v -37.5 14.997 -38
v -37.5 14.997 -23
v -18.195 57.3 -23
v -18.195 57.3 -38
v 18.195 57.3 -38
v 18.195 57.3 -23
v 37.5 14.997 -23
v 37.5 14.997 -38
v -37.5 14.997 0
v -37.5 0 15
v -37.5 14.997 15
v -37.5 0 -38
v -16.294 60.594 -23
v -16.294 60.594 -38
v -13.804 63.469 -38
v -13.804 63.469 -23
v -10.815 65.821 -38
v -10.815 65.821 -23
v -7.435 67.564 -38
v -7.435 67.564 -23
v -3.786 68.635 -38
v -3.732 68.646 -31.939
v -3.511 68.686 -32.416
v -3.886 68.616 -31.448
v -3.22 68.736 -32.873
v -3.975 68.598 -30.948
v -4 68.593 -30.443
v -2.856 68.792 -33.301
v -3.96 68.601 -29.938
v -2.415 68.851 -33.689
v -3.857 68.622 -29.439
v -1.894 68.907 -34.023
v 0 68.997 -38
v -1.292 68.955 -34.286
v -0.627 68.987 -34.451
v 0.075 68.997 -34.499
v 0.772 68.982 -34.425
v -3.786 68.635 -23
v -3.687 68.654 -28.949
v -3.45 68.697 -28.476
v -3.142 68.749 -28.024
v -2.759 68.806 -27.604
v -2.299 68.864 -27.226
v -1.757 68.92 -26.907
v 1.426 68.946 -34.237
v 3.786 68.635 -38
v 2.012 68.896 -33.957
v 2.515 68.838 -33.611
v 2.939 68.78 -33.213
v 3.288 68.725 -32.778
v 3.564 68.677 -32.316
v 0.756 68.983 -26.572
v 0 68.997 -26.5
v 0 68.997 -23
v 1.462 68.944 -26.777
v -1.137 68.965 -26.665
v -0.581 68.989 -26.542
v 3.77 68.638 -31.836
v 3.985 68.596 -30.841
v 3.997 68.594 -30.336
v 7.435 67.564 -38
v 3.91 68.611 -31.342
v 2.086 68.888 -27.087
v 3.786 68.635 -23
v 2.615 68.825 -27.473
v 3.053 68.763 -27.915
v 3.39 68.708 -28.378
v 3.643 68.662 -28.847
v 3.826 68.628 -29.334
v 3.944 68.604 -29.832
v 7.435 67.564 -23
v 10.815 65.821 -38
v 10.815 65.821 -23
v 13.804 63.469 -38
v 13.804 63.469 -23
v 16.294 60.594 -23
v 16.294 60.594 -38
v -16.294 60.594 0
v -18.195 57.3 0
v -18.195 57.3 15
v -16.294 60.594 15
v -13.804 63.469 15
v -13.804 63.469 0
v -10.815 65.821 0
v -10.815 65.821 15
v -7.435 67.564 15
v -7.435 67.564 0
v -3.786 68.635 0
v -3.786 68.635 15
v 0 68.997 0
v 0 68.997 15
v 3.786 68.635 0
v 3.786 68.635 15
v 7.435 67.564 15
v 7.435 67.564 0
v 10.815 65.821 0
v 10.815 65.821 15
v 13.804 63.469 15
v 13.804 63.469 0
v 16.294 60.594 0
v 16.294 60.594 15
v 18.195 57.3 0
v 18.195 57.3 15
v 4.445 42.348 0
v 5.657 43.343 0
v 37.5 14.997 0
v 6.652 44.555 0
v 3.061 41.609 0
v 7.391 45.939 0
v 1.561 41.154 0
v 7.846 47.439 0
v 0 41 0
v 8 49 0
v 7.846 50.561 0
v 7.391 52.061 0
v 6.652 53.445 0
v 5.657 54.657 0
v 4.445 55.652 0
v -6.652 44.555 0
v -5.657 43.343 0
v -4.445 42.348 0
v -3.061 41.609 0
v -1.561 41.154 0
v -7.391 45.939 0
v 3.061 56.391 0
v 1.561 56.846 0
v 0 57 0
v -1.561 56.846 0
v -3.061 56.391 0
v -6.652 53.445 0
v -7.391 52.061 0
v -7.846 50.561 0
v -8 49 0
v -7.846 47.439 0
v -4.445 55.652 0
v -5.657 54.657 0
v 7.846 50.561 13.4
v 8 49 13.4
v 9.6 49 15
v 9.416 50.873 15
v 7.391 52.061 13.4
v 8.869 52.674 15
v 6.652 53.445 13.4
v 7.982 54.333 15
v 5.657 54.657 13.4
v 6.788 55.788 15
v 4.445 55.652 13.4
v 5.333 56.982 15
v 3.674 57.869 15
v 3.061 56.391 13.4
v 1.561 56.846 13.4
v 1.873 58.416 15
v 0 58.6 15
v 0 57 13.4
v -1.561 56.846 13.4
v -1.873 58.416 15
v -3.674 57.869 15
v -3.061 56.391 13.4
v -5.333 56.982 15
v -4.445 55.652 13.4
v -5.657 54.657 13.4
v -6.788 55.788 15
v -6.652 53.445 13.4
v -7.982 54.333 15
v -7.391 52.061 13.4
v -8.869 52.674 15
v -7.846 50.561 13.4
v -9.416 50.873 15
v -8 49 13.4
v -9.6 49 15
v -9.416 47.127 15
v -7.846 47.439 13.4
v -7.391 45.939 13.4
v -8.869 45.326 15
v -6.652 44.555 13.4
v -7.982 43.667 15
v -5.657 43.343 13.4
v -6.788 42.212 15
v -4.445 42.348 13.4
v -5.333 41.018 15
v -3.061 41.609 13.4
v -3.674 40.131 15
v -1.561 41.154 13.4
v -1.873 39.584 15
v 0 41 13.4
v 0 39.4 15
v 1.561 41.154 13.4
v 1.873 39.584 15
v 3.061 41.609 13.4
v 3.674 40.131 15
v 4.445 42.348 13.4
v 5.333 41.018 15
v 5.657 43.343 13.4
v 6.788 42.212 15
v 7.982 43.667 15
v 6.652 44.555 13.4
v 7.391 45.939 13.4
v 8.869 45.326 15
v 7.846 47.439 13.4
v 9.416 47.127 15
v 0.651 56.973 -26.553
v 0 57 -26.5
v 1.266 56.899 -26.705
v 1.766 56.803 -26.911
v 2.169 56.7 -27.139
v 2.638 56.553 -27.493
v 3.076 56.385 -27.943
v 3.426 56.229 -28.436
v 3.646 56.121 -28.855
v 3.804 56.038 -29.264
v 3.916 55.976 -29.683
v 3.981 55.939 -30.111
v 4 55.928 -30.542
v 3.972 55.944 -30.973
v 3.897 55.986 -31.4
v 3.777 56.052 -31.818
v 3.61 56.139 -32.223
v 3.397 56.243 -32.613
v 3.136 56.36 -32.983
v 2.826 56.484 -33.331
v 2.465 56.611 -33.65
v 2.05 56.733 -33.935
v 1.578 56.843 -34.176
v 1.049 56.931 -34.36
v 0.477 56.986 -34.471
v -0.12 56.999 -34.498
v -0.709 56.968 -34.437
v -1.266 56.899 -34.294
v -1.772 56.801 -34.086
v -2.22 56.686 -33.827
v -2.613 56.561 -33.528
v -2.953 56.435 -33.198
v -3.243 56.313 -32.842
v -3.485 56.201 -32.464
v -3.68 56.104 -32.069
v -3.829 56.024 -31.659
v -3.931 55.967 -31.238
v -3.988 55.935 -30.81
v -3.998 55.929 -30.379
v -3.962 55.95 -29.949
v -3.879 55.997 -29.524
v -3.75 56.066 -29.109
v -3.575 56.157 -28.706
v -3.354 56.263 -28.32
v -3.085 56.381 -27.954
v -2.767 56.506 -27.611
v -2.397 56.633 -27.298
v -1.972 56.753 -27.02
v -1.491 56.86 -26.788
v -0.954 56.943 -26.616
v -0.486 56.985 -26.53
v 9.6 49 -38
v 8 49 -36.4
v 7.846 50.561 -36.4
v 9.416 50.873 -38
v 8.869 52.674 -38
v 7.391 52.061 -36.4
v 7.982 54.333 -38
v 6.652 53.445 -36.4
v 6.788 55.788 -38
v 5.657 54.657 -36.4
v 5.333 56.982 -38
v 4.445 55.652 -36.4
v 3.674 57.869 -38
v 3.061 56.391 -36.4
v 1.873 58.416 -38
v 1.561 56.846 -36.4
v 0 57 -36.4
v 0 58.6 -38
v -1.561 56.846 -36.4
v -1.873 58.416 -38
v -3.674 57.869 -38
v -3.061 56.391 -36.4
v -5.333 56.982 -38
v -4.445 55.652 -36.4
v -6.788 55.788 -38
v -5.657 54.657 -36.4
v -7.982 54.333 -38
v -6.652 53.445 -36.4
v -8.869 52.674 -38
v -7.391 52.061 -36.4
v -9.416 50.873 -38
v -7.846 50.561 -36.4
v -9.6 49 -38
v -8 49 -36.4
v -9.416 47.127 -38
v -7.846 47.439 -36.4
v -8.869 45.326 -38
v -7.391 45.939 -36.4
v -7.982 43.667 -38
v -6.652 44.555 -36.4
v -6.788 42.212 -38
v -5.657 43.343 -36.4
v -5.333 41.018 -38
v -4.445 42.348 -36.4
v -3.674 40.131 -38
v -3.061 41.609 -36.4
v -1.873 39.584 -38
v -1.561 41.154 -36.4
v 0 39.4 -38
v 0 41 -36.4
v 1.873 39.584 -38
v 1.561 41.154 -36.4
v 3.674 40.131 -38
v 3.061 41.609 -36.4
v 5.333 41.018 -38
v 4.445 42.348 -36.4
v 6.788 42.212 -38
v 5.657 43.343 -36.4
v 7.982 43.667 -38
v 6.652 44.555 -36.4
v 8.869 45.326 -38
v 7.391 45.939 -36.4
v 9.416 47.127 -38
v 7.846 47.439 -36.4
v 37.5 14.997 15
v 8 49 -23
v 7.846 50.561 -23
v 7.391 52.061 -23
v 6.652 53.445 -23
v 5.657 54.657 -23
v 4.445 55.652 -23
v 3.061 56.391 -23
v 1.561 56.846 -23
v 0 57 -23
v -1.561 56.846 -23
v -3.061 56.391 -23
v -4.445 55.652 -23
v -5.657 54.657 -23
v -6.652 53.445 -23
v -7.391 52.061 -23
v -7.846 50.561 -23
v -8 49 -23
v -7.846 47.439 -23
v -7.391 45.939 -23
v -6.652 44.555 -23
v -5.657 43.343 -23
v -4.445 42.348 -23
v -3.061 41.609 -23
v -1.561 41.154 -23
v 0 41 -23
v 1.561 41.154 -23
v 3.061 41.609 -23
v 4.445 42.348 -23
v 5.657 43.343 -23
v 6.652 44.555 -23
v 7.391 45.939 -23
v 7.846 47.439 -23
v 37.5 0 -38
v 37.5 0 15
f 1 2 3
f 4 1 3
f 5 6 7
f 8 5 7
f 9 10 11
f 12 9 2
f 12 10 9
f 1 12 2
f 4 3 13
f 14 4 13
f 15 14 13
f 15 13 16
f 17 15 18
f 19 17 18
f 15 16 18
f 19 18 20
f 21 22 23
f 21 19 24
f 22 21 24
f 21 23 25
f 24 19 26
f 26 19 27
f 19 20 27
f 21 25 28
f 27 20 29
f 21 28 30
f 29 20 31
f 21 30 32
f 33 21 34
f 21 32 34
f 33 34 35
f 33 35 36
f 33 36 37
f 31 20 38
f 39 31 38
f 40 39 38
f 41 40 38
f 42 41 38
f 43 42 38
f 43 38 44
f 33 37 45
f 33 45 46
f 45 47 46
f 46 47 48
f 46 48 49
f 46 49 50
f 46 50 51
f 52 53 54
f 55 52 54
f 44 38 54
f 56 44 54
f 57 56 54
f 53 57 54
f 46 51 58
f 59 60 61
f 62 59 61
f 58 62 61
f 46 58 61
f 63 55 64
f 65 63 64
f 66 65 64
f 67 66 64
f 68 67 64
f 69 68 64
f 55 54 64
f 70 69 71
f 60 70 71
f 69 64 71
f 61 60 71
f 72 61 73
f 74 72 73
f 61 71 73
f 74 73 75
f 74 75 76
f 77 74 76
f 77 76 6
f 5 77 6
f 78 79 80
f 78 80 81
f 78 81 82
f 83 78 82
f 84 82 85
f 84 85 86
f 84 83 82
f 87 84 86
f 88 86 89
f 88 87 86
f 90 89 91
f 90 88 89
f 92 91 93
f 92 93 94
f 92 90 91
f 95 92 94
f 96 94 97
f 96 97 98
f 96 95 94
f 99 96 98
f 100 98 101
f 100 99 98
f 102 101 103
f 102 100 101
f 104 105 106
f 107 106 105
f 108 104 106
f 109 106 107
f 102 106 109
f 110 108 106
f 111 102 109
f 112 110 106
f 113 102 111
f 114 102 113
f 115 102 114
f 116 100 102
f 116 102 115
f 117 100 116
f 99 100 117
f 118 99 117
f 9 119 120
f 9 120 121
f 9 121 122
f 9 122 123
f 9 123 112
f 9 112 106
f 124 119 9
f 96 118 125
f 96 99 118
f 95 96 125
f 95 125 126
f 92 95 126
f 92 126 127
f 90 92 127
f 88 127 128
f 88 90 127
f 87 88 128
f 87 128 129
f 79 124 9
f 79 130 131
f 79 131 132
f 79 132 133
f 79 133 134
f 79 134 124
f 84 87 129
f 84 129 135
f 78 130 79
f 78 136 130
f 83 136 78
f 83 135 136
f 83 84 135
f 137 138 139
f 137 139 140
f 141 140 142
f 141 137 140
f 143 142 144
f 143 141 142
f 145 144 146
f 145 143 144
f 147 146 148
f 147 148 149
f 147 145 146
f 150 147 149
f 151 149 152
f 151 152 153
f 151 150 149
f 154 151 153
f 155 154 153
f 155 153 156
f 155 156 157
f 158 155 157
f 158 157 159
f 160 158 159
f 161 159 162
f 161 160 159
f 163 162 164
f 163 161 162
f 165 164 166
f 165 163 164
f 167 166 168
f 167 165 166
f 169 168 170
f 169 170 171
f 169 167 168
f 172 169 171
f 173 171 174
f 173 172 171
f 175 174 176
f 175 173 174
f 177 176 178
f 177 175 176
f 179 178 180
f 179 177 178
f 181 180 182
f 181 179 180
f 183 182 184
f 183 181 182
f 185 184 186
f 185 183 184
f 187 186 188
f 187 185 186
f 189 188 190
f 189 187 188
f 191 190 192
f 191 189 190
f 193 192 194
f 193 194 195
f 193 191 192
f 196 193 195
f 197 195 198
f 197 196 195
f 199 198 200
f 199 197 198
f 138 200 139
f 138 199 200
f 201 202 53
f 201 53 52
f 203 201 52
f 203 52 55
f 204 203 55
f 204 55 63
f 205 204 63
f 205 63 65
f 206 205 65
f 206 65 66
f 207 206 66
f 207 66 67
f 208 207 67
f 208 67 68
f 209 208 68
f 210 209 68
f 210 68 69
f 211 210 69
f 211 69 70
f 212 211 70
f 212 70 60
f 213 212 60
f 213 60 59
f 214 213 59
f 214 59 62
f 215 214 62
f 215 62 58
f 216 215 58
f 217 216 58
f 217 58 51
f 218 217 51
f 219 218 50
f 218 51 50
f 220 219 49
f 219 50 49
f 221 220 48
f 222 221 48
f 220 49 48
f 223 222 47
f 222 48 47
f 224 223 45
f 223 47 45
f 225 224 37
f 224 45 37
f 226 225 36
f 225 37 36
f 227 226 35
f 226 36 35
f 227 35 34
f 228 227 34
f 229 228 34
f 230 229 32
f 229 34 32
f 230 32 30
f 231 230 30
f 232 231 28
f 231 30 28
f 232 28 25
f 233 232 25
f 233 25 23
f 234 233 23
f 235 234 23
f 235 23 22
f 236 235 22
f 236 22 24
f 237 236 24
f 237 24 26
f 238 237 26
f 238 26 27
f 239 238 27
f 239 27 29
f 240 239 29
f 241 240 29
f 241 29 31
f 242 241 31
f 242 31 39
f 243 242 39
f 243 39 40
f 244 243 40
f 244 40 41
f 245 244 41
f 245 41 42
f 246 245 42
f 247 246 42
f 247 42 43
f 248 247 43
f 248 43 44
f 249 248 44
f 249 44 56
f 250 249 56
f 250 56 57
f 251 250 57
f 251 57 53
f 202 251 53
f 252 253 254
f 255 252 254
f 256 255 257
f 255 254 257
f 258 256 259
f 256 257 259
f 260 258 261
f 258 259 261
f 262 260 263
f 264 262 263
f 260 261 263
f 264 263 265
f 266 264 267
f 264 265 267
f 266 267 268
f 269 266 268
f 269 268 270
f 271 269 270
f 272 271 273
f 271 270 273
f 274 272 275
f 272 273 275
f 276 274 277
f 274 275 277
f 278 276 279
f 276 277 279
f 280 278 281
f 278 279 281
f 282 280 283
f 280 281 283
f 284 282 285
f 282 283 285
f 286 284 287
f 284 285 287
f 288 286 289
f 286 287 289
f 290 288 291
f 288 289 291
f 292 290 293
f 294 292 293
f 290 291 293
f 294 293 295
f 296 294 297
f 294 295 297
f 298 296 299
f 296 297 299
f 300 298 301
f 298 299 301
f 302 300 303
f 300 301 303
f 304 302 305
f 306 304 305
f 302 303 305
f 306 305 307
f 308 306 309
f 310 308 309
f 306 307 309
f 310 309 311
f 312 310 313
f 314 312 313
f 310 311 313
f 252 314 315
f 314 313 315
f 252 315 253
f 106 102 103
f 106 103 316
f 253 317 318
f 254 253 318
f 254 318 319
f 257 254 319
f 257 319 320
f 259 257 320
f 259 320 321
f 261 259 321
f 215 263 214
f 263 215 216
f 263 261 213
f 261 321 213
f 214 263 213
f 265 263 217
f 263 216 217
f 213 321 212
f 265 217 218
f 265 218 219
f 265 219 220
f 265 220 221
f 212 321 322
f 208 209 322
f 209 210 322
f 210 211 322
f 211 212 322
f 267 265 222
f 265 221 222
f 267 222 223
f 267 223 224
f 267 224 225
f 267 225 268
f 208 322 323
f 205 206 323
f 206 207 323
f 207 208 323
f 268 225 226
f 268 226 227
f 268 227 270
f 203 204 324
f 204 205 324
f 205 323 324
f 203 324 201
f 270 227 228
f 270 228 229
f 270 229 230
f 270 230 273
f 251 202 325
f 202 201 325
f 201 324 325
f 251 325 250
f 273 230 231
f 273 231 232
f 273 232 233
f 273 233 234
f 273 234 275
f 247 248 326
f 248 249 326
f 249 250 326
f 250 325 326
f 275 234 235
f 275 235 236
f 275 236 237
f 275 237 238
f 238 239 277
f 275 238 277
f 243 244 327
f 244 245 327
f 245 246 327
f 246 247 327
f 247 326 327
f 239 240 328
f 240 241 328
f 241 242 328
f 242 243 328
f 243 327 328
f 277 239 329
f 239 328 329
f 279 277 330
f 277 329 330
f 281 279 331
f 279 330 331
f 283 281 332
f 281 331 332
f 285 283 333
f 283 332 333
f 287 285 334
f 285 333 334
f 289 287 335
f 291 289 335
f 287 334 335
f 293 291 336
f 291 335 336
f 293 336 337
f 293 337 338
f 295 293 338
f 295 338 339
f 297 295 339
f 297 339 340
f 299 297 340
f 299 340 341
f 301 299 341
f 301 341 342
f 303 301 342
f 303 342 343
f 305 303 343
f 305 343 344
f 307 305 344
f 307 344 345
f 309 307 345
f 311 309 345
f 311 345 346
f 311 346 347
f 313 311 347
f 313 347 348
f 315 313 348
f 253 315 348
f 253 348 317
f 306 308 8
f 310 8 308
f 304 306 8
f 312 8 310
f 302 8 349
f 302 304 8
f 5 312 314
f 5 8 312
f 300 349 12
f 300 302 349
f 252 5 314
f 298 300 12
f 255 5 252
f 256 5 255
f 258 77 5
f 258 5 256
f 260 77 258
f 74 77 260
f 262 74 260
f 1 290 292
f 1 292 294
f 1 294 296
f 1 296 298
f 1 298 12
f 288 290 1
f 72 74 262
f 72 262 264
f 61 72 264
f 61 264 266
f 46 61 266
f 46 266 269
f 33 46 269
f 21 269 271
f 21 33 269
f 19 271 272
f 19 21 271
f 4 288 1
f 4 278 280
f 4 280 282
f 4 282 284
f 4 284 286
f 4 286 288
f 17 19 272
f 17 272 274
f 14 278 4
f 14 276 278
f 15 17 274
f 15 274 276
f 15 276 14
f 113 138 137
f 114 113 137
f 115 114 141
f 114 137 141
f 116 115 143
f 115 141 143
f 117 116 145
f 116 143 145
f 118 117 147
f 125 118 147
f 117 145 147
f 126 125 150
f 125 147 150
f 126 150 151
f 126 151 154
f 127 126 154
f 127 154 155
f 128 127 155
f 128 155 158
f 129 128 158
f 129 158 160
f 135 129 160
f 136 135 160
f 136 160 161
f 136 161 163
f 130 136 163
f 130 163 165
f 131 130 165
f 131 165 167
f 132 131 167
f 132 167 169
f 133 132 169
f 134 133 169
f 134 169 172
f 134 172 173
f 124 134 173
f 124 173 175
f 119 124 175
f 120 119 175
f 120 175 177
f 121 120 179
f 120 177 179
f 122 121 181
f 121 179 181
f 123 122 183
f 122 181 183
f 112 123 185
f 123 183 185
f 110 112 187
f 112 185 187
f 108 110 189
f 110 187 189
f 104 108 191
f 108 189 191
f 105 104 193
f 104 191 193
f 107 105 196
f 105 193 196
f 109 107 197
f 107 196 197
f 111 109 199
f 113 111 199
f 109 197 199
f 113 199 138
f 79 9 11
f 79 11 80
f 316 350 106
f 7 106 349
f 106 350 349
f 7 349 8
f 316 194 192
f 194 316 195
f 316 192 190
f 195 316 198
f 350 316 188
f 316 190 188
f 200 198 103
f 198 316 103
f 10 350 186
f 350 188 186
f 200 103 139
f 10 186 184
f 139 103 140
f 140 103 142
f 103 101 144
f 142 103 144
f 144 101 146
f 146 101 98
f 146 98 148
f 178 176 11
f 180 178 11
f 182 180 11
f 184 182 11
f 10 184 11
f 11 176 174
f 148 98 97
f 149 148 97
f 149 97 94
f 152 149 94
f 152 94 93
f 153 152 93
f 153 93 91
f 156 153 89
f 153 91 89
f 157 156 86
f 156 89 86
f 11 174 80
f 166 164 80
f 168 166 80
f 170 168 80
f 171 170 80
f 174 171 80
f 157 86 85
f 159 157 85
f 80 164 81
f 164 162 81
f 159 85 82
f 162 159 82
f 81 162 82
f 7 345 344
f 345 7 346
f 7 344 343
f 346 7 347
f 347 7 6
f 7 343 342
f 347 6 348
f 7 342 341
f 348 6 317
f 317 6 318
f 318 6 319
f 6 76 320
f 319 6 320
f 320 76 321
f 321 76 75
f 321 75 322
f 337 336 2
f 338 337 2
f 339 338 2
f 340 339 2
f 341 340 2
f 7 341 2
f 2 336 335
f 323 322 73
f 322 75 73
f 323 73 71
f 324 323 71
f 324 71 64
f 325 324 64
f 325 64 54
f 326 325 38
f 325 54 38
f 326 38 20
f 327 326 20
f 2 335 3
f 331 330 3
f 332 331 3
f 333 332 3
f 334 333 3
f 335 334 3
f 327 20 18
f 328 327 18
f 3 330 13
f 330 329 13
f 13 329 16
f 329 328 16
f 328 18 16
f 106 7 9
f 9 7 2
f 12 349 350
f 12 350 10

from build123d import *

# Parameters (mm, degrees)
P_IDAT_VYSUNUT_M1_DEPTH       = 15
SKICA4_W                      = 75
SKICA4_H                      = 14.99699372
P_IDAT_VYSUNUT_M2_DEPTH       = 11.5
SKICA6_R                      = 8
ODEBRAT_VYSUNUT_M1_DEPTH      = 54
ODEBRAT_VYSUNUT_M2_REACH      = 71
ODEBRAT_VYSUNUT_M2_END_RADIUS = 8
SKICA7_R                      = 4
ZKOSEN_1_SIZE                 = 1.6


with BuildPart() as part:
    # Skica1 → Přidat vysunutím1 (new body)
    with BuildSketch(Plane.XY):
        with BuildLine():
            Line((-37.5, 0), (-37.5, 14.99699372))
            Line((-37.5, 14.99699372), (-18.194945848, 57.300242817))
            ThreePointArc((-18.194945848, 57.300242817), (0, 68.99699372), (18.194945848, 57.300242817))
            Line((18.194945848, 57.300242817), (37.5, 14.99699372))
            Line((37.5, 14.99699372), (37.5, 0))
            Line((37.5, 0), (-37.5, 0))
        make_face()
    extrude(amount=P_IDAT_VYSUNUT_M1_DEPTH)

    # Skica4 → Přidat vysunutím2 (add)
    with BuildSketch(Plane(origin=(0, 0, 0), x_dir=(-1, 0, 0), z_dir=(0, 0, -1))):
        with Locations((0, 7.49849686)):
            Rectangle(SKICA4_W, SKICA4_H)
    extrude(amount=P_IDAT_VYSUNUT_M2_DEPTH)

    # Zrcadlit1: part across plane


with BuildPart() as part_1:
    add(part.part)
    add(part.part.mirror(Plane.XY.offset(-11.5)))

    # Skica6 → Odebrat vysunutím1 (cut, through all)
    with BuildSketch(Plane.XY.offset(15)):
        with Locations((0, 49)):
            Circle(SKICA6_R)
    extrude(amount=-ODEBRAT_VYSUNUT_M1_DEPTH, mode=Mode.SUBTRACT)

    # Odebrat vysunutím2: up to this cylinder (the profile starts outside it)
    odebrat_vysunut_m2_end = Plane(origin=(0, 49, -30.5), z_dir=(0, 0, 1)) * Cylinder(ODEBRAT_VYSUNUT_M2_END_RADIUS, 159, mode=Mode.PRIVATE)
    # Skica7 → Odebrat vysunutím2 (cut, up to the surface)
    with BuildSketch(Plane(origin=(0, 69, 0), x_dir=(1, 0, 0), z_dir=(0, 1, 0)), mode=Mode.PRIVATE) as odebrat_vysunut_m2_sk1:
        with Locations(Location((0, 30.5, 0), (0, 0, 270))):  # turned: the seam where the file's is
            Circle(SKICA7_R)
    odebrat_vysunut_m2_tool1 = extrude(odebrat_vysunut_m2_sk1.sketch, amount=-ODEBRAT_VYSUNUT_M2_REACH, mode=Mode.PRIVATE) - odebrat_vysunut_m2_end
    add(odebrat_vysunut_m2_tool1.solids().sort_by_distance((0, 69, -30.5))[0], mode=Mode.SUBTRACT)

    # Zkosení1
    zkosen_1_edges = [part_1.edges().sort_by_distance(p)[0] for p in [
        (-8, 49, -38),
        (-8, 49, 15),
    ]]
    chamfer(zkosen_1_edges, length=ZKOSEN_1_SIZE)


solid = part_1.part
